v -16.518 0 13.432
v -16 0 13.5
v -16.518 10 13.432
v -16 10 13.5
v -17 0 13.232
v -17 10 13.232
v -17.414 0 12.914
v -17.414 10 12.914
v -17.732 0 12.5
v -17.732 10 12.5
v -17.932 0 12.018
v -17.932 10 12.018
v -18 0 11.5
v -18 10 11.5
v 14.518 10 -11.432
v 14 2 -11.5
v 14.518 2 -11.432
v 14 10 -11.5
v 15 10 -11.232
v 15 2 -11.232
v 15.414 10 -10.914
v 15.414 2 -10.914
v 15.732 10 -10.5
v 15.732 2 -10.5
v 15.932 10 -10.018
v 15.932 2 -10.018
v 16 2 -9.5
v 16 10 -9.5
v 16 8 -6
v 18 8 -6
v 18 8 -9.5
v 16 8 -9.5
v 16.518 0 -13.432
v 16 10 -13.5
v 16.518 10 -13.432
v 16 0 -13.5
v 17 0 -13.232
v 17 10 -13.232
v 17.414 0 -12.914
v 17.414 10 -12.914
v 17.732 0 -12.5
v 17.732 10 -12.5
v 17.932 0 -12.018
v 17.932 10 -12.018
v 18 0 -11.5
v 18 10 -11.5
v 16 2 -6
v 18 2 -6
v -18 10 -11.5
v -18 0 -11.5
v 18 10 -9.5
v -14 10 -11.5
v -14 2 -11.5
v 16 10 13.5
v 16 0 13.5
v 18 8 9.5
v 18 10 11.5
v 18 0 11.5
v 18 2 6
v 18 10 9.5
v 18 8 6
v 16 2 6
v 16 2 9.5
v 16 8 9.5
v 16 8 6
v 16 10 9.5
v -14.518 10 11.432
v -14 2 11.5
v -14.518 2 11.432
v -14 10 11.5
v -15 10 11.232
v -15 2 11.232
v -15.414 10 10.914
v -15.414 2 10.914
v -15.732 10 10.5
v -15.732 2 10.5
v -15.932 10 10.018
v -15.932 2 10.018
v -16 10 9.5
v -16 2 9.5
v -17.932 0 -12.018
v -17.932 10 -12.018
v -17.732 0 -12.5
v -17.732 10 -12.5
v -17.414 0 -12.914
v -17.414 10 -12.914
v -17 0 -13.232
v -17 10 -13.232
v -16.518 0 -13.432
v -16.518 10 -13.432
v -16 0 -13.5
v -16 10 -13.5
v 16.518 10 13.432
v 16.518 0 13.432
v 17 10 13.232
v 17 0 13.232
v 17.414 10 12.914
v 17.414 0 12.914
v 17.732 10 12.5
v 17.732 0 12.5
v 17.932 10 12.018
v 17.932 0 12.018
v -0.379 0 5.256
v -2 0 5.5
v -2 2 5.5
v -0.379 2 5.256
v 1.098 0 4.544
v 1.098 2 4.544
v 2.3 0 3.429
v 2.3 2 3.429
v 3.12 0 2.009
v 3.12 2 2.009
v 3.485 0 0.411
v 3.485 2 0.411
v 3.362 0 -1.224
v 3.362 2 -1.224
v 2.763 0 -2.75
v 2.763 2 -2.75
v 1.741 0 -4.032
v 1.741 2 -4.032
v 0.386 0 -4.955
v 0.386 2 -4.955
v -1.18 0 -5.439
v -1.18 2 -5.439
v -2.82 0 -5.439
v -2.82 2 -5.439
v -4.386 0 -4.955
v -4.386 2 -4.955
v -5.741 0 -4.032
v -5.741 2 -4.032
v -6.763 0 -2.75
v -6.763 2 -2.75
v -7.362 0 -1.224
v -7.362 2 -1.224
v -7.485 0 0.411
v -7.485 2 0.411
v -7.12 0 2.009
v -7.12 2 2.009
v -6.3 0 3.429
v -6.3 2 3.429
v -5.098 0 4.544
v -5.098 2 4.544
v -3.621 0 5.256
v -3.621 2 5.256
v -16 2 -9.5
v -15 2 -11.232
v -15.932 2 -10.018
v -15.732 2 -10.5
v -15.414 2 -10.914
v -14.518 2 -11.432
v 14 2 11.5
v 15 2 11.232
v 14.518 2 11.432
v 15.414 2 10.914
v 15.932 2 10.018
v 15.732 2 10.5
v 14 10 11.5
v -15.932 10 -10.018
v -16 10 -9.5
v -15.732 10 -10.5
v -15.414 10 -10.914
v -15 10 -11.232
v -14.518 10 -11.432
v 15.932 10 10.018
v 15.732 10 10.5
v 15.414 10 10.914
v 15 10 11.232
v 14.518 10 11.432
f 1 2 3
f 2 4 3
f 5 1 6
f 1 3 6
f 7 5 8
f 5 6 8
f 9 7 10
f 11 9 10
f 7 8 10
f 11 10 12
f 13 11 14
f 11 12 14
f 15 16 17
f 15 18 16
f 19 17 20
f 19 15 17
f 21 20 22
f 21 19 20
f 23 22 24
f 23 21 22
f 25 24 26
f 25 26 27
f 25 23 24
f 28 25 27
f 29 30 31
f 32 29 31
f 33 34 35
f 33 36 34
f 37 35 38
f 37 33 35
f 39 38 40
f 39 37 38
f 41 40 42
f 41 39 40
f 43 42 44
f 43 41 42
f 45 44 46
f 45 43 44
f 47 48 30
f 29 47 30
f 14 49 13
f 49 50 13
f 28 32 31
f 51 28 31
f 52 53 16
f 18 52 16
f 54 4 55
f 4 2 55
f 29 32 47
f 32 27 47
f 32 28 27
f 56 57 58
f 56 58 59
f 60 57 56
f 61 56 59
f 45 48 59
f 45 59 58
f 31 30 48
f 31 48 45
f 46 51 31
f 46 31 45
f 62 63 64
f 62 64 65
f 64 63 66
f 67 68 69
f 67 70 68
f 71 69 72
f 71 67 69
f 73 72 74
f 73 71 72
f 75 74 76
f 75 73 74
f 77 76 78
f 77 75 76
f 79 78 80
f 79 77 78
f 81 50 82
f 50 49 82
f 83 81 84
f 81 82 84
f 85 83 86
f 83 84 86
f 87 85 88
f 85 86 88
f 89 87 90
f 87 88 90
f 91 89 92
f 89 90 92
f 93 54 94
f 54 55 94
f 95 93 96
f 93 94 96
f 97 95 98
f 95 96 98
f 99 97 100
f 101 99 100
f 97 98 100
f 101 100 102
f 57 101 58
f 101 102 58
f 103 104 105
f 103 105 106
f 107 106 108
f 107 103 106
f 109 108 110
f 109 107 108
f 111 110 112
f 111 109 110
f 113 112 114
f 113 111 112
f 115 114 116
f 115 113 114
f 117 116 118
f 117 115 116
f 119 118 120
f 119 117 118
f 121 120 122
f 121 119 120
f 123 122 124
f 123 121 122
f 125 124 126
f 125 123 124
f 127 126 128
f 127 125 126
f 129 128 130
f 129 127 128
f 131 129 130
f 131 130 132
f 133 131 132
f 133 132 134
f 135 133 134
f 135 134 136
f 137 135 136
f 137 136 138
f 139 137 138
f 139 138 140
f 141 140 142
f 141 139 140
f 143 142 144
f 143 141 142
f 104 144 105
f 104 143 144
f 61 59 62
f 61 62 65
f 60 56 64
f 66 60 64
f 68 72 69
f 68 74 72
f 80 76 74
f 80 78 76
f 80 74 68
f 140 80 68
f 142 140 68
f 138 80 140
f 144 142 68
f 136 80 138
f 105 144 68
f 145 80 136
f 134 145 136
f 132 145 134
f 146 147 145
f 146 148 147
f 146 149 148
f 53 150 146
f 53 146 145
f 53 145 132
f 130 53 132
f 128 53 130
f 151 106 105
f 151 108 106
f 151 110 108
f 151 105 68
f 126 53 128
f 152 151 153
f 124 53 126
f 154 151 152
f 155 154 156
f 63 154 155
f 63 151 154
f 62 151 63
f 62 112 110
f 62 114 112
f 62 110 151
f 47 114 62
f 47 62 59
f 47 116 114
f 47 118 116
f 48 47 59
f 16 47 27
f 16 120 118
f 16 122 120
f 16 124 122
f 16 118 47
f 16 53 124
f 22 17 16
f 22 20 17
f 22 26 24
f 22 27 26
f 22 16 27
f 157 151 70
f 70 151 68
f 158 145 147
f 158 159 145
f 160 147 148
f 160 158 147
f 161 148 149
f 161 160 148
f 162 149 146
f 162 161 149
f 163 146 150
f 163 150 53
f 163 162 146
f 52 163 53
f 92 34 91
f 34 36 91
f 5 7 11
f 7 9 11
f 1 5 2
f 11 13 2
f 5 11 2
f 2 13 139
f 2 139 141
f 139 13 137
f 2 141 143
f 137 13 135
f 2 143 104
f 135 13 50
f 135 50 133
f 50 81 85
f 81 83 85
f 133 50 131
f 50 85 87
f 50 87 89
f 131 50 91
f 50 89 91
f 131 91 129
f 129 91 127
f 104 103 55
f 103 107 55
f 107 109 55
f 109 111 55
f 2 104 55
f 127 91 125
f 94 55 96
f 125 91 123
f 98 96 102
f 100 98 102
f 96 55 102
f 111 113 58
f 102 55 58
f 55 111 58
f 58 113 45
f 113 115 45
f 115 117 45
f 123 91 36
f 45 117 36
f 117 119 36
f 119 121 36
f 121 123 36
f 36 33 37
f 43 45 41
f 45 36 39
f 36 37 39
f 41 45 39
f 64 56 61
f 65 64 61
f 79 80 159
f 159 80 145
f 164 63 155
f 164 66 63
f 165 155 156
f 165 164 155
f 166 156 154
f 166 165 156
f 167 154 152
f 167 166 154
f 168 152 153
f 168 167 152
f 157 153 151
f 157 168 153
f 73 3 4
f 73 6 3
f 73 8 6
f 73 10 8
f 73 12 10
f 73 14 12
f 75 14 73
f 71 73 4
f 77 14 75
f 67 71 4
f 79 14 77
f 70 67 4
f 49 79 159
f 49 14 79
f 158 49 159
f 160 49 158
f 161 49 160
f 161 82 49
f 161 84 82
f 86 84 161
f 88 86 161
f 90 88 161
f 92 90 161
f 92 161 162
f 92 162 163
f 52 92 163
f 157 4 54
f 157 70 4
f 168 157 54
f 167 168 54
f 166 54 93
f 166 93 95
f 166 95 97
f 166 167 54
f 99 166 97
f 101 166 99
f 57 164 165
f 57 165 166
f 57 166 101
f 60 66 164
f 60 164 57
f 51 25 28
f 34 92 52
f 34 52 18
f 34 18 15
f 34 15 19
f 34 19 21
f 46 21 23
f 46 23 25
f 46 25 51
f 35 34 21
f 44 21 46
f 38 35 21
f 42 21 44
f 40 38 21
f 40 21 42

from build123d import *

# Parameters (mm, degrees)
SKETCH1_W           = 36
SKETCH1_H           = 27
SKETCH1_R           = 5.5
BOSS_EXTRUDE1_DEPTH = 2
BOSS_EXTRUDE2_DEPTH = 8
SKETCH3_W           = 3.5
SKETCH3_H           = 6
BOSS_EXTRUDE3_DEPTH = 2
FILLET2_R           = 2


with BuildPart() as part:
    # Sketch1 → Boss-Extrude1 (new body)
    with BuildSketch(Plane(origin=(0, 0, 0), x_dir=(1, 0, 0), z_dir=(0, 1, 0))):
        Rectangle(SKETCH1_W, SKETCH1_H)
        with Locations(Location((-2, 0, 0), (0, 0, 270))):
            Circle(SKETCH1_R, mode=Mode.SUBTRACT)
    extrude(amount=BOSS_EXTRUDE1_DEPTH)

    # Sketch2 → Boss-Extrude2 (add)
    with BuildSketch(Plane(origin=(0, 2, 0), x_dir=(1, 0, 0), z_dir=(0, 1, 0))):
        Polygon((18, 13.5), (-18, 13.5), (-18, -13.5), (18, -13.5), (18, -9.5), (16, -9.5), (16, -11.5), (-16, -11.5), (-16, 11.5), (16, 11.5), (16, 9.5), (18, 9.5), align=None)
    extrude(amount=BOSS_EXTRUDE2_DEPTH)

    # Sketch3 → Boss-Extrude3 (add)
    with BuildSketch(Plane(origin=(18, 0, 0), x_dir=(0, 0, -1), z_dir=(1, 0, 0))):
        with Locations((-7.75, 5)):
            Rectangle(SKETCH3_W, SKETCH3_H)
        with Locations((7.75, 5)):
            Rectangle(SKETCH3_W, SKETCH3_H)
    extrude(amount=-BOSS_EXTRUDE3_DEPTH)

    # Fillet2
    fillet2_edges = [part.edges().sort_by_distance(p)[0] for p in [
        (-18, 5, 13.5),
        (-18, 5, -13.5),
        (18, 5, -13.5),
        (18, 5, 13.5),
        (16, 6, -11.5),
        (16, 6, 11.5),
        (-16, 6, 11.5),
        (-16, 6, -11.5),
    ]]
    fillet(fillet2_edges, radius=FILLET2_R - 0.0001)  # a hair under: the kernel refuses the full size


solid = part.part
